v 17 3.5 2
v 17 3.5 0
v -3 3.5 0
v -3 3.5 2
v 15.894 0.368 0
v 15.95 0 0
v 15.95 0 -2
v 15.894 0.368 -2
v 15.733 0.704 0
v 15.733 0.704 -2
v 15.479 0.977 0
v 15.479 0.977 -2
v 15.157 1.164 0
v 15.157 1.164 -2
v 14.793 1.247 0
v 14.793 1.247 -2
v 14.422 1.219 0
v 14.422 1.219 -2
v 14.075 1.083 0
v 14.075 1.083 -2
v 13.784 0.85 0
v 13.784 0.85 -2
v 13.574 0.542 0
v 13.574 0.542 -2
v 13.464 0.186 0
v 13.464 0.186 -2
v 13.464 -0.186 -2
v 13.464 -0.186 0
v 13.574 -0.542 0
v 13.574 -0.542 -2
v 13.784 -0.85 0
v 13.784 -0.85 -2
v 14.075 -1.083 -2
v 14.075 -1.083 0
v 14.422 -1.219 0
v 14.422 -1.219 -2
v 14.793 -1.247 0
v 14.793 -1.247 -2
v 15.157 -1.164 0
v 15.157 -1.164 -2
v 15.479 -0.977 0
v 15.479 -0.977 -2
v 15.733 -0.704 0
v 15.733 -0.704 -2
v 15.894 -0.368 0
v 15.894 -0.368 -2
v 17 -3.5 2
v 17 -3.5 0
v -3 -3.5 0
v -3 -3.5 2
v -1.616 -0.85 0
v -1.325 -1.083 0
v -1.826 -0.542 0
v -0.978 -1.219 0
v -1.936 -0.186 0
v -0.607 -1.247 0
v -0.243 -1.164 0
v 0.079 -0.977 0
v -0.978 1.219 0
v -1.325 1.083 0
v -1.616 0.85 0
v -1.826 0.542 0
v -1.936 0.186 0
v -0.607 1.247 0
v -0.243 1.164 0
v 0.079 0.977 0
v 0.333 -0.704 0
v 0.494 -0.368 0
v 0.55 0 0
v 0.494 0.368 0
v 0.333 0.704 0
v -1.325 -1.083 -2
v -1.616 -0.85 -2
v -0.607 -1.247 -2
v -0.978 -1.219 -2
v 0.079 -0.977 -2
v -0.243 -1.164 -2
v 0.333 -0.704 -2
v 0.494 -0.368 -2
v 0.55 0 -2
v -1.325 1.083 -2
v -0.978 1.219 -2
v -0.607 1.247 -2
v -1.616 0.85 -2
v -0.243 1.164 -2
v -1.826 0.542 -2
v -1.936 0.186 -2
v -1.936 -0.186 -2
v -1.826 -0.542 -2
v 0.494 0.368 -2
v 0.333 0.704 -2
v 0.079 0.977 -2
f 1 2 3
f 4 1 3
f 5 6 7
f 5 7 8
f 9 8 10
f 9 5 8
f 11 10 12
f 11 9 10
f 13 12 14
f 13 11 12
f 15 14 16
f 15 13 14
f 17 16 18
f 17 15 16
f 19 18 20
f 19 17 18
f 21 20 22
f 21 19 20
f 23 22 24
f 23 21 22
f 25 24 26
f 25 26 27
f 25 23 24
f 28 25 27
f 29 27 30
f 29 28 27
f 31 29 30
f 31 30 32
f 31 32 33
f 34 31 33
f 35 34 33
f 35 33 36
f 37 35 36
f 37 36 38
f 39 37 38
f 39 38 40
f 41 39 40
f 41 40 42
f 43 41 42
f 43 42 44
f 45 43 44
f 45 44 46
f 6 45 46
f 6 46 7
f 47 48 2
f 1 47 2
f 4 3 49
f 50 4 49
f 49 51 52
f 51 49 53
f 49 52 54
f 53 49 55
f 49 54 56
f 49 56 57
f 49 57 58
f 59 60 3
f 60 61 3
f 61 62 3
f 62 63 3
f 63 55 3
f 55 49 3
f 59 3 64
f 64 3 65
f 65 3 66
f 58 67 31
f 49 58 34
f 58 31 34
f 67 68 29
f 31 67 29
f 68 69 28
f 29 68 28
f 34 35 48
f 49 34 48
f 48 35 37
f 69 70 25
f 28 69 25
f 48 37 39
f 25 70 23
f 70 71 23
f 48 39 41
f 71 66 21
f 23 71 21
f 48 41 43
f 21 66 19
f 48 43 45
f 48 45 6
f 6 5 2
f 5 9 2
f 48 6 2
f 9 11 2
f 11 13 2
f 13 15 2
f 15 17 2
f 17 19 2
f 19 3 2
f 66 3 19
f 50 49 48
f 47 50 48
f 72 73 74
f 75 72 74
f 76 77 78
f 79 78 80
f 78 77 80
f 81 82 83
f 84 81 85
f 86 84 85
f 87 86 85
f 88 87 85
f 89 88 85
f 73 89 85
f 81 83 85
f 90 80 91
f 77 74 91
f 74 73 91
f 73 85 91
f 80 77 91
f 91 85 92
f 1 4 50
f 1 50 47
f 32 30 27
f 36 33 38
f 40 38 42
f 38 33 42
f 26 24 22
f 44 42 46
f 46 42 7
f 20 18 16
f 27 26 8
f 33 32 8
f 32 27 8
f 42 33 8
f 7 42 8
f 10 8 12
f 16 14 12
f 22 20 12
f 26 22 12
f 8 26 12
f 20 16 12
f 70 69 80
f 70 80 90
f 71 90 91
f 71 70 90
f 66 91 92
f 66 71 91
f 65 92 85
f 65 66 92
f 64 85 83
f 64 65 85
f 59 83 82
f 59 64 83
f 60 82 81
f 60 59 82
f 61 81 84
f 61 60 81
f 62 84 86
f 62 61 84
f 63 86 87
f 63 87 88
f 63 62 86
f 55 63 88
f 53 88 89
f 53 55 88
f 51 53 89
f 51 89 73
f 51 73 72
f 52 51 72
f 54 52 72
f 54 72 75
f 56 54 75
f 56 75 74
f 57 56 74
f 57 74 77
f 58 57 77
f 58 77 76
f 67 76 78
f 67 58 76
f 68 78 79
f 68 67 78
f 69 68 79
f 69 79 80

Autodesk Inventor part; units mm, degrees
ref_plane "YZ Plane" through (0, 0, 0) normal (1, 0, 0) x (0, 1, 0)
ref_plane "XZ Plane" through (0, 0, 0) normal (0, 1, 0) x (-1, 0, 0)
ref_plane "XY Plane" through (0, 0, 0) normal (0, 0, 1) x (1, 0, 0)
sketch "Sketch5" plane through (0, 0, 0) normal (0, 0, 1) x (1, 0, 0)
  line L0 (7, -1.5) -> (0.5048, -1.5) projected
  circle A0 centre (14.7, 0) radius 1.25 projected
  circle A1 centre (-0.7, 0) radius 1.25 projected
  line L1 (-3, -3.5) -> (17, -3.5) projected
  line L2 (17, -3.5) -> (17, 3.5) projected
  line L3 (17, 3.5) -> (-3, 3.5) projected
  line L4 (-3, 3.5) -> (-3, -3.5) projected
  point P0 (0, 0)
extrude "Extrusion7" add sketch "Sketch5" along normal blind 2 contours A0 | A1 | L4 L3 L2 L1
extrude "Extrusion8" add sketch "Sketch5" against normal blind 2 contours A0 | A1
properties part number "test_izbrisi"
